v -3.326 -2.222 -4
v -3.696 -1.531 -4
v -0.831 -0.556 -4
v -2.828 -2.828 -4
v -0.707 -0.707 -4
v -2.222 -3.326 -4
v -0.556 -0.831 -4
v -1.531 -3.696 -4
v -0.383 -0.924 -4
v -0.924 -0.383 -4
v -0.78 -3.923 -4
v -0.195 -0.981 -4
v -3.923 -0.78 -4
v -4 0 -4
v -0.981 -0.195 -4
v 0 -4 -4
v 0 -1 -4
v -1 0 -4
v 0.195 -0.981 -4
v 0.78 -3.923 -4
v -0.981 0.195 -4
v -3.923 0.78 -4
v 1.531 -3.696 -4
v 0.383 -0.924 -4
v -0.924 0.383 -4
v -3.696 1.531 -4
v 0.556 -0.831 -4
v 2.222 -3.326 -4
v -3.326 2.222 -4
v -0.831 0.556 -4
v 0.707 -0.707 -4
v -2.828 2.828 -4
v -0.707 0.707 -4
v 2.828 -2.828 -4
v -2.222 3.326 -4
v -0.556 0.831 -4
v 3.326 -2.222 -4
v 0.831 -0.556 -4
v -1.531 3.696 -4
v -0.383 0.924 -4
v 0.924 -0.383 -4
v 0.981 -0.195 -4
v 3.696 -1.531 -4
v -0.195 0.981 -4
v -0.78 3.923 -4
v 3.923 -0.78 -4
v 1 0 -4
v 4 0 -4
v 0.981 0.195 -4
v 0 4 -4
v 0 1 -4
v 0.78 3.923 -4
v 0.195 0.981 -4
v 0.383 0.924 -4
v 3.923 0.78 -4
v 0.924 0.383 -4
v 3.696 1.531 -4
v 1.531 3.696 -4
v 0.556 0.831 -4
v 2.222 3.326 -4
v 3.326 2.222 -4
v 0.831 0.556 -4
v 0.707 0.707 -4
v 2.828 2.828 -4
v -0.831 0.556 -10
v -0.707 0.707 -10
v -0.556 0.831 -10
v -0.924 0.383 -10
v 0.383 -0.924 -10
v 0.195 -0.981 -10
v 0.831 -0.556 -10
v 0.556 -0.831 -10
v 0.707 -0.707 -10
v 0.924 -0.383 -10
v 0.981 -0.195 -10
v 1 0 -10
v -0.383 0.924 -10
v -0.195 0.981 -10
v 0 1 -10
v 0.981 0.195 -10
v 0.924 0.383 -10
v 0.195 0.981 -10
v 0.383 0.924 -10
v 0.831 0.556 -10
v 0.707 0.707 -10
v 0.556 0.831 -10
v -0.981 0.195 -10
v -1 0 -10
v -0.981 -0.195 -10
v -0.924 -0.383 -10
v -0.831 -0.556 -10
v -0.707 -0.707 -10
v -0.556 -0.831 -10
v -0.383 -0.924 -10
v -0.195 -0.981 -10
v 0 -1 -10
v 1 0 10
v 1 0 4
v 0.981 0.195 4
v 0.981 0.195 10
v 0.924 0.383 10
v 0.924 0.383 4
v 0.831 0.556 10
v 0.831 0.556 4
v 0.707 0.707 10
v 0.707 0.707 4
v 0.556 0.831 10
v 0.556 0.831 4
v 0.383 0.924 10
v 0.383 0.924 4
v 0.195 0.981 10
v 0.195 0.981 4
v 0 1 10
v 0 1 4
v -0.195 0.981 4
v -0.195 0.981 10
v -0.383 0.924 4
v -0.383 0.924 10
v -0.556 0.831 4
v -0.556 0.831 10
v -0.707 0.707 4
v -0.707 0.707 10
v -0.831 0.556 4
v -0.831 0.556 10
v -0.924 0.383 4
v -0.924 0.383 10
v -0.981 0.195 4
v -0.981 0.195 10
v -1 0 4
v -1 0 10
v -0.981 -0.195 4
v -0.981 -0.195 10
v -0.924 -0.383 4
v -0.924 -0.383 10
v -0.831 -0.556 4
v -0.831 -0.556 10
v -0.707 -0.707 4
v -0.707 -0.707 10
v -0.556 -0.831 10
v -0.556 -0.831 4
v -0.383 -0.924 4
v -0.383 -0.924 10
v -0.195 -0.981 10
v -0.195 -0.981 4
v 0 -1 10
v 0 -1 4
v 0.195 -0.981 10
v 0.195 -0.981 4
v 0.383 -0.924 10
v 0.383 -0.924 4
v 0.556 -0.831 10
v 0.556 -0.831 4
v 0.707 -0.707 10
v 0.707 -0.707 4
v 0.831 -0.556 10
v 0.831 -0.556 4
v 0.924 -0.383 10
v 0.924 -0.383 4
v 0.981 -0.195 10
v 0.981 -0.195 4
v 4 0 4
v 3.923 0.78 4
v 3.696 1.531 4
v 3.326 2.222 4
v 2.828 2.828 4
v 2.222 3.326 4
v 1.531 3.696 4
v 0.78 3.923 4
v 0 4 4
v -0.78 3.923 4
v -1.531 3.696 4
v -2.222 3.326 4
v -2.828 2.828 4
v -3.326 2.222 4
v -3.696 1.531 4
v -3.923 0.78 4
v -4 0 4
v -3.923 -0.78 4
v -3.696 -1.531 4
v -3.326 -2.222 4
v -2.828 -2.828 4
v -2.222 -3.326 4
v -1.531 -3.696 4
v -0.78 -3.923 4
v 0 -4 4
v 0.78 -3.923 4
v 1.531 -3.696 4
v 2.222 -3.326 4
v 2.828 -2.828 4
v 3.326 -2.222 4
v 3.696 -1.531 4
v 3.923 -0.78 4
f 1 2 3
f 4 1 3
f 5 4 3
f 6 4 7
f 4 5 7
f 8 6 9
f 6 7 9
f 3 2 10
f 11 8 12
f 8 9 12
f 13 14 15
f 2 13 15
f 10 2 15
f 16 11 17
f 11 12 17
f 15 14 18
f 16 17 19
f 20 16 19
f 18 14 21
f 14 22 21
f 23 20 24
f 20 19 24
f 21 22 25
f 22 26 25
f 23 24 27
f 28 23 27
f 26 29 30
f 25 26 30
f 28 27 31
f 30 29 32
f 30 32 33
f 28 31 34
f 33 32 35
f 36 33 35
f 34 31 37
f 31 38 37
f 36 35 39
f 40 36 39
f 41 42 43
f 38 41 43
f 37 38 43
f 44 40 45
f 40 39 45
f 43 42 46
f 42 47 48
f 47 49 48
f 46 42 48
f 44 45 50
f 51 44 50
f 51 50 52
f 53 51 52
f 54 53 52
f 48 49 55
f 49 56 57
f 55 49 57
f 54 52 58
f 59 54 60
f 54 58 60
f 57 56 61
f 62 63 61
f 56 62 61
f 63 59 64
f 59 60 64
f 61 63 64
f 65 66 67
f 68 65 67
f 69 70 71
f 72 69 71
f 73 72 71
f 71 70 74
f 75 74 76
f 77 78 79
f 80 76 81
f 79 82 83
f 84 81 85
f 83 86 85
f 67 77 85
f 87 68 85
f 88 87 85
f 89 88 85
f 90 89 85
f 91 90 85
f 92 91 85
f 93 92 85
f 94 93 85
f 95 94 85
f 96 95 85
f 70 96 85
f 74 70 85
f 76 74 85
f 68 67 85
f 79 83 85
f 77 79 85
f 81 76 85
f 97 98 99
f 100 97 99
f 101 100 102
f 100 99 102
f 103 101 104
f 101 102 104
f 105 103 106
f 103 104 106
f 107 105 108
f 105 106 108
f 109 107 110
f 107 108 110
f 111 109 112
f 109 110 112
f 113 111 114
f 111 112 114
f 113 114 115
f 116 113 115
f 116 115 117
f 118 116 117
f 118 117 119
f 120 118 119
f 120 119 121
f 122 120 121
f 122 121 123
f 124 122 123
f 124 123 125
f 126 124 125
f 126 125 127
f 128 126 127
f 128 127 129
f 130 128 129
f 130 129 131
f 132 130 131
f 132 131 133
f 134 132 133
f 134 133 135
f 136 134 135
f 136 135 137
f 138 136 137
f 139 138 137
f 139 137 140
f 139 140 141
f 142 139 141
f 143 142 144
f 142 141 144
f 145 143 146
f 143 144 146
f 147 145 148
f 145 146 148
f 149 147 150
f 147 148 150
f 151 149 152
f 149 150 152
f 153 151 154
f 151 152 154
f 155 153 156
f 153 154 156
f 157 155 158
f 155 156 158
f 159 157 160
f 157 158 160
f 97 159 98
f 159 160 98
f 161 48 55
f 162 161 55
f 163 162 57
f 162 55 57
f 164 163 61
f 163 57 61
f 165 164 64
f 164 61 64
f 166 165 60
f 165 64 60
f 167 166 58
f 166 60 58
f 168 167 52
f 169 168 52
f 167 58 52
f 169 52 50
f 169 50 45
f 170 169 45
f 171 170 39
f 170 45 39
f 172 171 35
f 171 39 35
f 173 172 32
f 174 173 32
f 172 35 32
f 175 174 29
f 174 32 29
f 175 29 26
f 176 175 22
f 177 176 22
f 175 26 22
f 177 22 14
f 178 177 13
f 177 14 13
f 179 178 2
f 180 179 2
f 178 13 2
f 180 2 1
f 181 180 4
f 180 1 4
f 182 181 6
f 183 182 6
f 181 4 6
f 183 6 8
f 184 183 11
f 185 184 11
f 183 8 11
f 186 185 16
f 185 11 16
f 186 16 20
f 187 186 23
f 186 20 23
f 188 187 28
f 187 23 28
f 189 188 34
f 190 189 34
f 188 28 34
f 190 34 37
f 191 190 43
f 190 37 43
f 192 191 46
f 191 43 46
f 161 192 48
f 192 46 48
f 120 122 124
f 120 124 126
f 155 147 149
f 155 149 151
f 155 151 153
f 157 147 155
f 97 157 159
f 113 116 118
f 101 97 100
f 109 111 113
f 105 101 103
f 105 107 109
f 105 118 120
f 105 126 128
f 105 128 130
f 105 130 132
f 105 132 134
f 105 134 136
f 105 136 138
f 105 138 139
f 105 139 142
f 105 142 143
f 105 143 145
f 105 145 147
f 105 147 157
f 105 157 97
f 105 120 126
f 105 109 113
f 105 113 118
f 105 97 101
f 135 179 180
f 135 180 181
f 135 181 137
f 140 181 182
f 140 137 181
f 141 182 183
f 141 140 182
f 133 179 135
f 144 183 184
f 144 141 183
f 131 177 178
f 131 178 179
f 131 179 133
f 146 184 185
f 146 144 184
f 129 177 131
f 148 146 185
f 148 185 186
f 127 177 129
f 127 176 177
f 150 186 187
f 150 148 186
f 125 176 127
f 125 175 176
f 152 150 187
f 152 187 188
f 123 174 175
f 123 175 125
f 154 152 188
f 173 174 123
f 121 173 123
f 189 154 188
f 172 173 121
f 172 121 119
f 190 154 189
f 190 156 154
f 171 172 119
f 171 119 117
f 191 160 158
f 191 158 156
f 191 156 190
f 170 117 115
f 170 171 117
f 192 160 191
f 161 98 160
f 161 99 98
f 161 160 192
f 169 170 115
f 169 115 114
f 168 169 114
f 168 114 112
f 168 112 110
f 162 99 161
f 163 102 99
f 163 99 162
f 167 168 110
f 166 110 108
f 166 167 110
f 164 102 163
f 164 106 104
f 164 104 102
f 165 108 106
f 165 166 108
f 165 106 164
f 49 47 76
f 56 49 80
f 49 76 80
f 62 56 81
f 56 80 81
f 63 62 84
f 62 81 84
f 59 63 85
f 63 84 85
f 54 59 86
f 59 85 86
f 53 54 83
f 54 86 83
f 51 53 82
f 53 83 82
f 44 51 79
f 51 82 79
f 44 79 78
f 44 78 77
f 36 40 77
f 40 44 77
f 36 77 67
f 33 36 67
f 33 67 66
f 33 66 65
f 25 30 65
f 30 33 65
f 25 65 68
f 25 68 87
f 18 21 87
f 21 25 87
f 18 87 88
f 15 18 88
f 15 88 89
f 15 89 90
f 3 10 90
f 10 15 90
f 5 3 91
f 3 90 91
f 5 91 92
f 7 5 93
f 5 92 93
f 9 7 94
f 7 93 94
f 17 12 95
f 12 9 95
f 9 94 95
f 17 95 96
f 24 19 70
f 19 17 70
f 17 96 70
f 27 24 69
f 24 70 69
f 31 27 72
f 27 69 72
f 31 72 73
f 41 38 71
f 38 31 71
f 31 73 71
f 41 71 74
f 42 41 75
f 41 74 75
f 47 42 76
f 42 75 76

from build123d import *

# Parameters (mm, degrees)
BOSS_EXTRU_1_DEPTH      = 4
BOSS_EXTRU_1_DEPTH_BACK = 4
ESQUISSE1_R             = 4
BOSS_EXTRU_2_DEPTH      = 10
BOSS_EXTRU_2_DEPTH_BACK = 10
ESQUISSE2_R             = 1


with BuildPart() as part:
    # Esquisse1 → Boss.-Extru.1 (new, two sides: drawn at the far end of the back side and taken through both)
    with BuildSketch(Plane.XY.offset(-BOSS_EXTRU_1_DEPTH_BACK)):
        Circle(ESQUISSE1_R)
    extrude(amount=BOSS_EXTRU_1_DEPTH + BOSS_EXTRU_1_DEPTH_BACK)

    # Esquisse2 → Boss.-Extru.2 (add, two sides: drawn at the far end of the back side and taken through both)
    with BuildSketch(Plane.XY.offset(-BOSS_EXTRU_2_DEPTH_BACK)):
        Circle(ESQUISSE2_R)
    extrude(amount=BOSS_EXTRU_2_DEPTH + BOSS_EXTRU_2_DEPTH_BACK)


solid = part.part
